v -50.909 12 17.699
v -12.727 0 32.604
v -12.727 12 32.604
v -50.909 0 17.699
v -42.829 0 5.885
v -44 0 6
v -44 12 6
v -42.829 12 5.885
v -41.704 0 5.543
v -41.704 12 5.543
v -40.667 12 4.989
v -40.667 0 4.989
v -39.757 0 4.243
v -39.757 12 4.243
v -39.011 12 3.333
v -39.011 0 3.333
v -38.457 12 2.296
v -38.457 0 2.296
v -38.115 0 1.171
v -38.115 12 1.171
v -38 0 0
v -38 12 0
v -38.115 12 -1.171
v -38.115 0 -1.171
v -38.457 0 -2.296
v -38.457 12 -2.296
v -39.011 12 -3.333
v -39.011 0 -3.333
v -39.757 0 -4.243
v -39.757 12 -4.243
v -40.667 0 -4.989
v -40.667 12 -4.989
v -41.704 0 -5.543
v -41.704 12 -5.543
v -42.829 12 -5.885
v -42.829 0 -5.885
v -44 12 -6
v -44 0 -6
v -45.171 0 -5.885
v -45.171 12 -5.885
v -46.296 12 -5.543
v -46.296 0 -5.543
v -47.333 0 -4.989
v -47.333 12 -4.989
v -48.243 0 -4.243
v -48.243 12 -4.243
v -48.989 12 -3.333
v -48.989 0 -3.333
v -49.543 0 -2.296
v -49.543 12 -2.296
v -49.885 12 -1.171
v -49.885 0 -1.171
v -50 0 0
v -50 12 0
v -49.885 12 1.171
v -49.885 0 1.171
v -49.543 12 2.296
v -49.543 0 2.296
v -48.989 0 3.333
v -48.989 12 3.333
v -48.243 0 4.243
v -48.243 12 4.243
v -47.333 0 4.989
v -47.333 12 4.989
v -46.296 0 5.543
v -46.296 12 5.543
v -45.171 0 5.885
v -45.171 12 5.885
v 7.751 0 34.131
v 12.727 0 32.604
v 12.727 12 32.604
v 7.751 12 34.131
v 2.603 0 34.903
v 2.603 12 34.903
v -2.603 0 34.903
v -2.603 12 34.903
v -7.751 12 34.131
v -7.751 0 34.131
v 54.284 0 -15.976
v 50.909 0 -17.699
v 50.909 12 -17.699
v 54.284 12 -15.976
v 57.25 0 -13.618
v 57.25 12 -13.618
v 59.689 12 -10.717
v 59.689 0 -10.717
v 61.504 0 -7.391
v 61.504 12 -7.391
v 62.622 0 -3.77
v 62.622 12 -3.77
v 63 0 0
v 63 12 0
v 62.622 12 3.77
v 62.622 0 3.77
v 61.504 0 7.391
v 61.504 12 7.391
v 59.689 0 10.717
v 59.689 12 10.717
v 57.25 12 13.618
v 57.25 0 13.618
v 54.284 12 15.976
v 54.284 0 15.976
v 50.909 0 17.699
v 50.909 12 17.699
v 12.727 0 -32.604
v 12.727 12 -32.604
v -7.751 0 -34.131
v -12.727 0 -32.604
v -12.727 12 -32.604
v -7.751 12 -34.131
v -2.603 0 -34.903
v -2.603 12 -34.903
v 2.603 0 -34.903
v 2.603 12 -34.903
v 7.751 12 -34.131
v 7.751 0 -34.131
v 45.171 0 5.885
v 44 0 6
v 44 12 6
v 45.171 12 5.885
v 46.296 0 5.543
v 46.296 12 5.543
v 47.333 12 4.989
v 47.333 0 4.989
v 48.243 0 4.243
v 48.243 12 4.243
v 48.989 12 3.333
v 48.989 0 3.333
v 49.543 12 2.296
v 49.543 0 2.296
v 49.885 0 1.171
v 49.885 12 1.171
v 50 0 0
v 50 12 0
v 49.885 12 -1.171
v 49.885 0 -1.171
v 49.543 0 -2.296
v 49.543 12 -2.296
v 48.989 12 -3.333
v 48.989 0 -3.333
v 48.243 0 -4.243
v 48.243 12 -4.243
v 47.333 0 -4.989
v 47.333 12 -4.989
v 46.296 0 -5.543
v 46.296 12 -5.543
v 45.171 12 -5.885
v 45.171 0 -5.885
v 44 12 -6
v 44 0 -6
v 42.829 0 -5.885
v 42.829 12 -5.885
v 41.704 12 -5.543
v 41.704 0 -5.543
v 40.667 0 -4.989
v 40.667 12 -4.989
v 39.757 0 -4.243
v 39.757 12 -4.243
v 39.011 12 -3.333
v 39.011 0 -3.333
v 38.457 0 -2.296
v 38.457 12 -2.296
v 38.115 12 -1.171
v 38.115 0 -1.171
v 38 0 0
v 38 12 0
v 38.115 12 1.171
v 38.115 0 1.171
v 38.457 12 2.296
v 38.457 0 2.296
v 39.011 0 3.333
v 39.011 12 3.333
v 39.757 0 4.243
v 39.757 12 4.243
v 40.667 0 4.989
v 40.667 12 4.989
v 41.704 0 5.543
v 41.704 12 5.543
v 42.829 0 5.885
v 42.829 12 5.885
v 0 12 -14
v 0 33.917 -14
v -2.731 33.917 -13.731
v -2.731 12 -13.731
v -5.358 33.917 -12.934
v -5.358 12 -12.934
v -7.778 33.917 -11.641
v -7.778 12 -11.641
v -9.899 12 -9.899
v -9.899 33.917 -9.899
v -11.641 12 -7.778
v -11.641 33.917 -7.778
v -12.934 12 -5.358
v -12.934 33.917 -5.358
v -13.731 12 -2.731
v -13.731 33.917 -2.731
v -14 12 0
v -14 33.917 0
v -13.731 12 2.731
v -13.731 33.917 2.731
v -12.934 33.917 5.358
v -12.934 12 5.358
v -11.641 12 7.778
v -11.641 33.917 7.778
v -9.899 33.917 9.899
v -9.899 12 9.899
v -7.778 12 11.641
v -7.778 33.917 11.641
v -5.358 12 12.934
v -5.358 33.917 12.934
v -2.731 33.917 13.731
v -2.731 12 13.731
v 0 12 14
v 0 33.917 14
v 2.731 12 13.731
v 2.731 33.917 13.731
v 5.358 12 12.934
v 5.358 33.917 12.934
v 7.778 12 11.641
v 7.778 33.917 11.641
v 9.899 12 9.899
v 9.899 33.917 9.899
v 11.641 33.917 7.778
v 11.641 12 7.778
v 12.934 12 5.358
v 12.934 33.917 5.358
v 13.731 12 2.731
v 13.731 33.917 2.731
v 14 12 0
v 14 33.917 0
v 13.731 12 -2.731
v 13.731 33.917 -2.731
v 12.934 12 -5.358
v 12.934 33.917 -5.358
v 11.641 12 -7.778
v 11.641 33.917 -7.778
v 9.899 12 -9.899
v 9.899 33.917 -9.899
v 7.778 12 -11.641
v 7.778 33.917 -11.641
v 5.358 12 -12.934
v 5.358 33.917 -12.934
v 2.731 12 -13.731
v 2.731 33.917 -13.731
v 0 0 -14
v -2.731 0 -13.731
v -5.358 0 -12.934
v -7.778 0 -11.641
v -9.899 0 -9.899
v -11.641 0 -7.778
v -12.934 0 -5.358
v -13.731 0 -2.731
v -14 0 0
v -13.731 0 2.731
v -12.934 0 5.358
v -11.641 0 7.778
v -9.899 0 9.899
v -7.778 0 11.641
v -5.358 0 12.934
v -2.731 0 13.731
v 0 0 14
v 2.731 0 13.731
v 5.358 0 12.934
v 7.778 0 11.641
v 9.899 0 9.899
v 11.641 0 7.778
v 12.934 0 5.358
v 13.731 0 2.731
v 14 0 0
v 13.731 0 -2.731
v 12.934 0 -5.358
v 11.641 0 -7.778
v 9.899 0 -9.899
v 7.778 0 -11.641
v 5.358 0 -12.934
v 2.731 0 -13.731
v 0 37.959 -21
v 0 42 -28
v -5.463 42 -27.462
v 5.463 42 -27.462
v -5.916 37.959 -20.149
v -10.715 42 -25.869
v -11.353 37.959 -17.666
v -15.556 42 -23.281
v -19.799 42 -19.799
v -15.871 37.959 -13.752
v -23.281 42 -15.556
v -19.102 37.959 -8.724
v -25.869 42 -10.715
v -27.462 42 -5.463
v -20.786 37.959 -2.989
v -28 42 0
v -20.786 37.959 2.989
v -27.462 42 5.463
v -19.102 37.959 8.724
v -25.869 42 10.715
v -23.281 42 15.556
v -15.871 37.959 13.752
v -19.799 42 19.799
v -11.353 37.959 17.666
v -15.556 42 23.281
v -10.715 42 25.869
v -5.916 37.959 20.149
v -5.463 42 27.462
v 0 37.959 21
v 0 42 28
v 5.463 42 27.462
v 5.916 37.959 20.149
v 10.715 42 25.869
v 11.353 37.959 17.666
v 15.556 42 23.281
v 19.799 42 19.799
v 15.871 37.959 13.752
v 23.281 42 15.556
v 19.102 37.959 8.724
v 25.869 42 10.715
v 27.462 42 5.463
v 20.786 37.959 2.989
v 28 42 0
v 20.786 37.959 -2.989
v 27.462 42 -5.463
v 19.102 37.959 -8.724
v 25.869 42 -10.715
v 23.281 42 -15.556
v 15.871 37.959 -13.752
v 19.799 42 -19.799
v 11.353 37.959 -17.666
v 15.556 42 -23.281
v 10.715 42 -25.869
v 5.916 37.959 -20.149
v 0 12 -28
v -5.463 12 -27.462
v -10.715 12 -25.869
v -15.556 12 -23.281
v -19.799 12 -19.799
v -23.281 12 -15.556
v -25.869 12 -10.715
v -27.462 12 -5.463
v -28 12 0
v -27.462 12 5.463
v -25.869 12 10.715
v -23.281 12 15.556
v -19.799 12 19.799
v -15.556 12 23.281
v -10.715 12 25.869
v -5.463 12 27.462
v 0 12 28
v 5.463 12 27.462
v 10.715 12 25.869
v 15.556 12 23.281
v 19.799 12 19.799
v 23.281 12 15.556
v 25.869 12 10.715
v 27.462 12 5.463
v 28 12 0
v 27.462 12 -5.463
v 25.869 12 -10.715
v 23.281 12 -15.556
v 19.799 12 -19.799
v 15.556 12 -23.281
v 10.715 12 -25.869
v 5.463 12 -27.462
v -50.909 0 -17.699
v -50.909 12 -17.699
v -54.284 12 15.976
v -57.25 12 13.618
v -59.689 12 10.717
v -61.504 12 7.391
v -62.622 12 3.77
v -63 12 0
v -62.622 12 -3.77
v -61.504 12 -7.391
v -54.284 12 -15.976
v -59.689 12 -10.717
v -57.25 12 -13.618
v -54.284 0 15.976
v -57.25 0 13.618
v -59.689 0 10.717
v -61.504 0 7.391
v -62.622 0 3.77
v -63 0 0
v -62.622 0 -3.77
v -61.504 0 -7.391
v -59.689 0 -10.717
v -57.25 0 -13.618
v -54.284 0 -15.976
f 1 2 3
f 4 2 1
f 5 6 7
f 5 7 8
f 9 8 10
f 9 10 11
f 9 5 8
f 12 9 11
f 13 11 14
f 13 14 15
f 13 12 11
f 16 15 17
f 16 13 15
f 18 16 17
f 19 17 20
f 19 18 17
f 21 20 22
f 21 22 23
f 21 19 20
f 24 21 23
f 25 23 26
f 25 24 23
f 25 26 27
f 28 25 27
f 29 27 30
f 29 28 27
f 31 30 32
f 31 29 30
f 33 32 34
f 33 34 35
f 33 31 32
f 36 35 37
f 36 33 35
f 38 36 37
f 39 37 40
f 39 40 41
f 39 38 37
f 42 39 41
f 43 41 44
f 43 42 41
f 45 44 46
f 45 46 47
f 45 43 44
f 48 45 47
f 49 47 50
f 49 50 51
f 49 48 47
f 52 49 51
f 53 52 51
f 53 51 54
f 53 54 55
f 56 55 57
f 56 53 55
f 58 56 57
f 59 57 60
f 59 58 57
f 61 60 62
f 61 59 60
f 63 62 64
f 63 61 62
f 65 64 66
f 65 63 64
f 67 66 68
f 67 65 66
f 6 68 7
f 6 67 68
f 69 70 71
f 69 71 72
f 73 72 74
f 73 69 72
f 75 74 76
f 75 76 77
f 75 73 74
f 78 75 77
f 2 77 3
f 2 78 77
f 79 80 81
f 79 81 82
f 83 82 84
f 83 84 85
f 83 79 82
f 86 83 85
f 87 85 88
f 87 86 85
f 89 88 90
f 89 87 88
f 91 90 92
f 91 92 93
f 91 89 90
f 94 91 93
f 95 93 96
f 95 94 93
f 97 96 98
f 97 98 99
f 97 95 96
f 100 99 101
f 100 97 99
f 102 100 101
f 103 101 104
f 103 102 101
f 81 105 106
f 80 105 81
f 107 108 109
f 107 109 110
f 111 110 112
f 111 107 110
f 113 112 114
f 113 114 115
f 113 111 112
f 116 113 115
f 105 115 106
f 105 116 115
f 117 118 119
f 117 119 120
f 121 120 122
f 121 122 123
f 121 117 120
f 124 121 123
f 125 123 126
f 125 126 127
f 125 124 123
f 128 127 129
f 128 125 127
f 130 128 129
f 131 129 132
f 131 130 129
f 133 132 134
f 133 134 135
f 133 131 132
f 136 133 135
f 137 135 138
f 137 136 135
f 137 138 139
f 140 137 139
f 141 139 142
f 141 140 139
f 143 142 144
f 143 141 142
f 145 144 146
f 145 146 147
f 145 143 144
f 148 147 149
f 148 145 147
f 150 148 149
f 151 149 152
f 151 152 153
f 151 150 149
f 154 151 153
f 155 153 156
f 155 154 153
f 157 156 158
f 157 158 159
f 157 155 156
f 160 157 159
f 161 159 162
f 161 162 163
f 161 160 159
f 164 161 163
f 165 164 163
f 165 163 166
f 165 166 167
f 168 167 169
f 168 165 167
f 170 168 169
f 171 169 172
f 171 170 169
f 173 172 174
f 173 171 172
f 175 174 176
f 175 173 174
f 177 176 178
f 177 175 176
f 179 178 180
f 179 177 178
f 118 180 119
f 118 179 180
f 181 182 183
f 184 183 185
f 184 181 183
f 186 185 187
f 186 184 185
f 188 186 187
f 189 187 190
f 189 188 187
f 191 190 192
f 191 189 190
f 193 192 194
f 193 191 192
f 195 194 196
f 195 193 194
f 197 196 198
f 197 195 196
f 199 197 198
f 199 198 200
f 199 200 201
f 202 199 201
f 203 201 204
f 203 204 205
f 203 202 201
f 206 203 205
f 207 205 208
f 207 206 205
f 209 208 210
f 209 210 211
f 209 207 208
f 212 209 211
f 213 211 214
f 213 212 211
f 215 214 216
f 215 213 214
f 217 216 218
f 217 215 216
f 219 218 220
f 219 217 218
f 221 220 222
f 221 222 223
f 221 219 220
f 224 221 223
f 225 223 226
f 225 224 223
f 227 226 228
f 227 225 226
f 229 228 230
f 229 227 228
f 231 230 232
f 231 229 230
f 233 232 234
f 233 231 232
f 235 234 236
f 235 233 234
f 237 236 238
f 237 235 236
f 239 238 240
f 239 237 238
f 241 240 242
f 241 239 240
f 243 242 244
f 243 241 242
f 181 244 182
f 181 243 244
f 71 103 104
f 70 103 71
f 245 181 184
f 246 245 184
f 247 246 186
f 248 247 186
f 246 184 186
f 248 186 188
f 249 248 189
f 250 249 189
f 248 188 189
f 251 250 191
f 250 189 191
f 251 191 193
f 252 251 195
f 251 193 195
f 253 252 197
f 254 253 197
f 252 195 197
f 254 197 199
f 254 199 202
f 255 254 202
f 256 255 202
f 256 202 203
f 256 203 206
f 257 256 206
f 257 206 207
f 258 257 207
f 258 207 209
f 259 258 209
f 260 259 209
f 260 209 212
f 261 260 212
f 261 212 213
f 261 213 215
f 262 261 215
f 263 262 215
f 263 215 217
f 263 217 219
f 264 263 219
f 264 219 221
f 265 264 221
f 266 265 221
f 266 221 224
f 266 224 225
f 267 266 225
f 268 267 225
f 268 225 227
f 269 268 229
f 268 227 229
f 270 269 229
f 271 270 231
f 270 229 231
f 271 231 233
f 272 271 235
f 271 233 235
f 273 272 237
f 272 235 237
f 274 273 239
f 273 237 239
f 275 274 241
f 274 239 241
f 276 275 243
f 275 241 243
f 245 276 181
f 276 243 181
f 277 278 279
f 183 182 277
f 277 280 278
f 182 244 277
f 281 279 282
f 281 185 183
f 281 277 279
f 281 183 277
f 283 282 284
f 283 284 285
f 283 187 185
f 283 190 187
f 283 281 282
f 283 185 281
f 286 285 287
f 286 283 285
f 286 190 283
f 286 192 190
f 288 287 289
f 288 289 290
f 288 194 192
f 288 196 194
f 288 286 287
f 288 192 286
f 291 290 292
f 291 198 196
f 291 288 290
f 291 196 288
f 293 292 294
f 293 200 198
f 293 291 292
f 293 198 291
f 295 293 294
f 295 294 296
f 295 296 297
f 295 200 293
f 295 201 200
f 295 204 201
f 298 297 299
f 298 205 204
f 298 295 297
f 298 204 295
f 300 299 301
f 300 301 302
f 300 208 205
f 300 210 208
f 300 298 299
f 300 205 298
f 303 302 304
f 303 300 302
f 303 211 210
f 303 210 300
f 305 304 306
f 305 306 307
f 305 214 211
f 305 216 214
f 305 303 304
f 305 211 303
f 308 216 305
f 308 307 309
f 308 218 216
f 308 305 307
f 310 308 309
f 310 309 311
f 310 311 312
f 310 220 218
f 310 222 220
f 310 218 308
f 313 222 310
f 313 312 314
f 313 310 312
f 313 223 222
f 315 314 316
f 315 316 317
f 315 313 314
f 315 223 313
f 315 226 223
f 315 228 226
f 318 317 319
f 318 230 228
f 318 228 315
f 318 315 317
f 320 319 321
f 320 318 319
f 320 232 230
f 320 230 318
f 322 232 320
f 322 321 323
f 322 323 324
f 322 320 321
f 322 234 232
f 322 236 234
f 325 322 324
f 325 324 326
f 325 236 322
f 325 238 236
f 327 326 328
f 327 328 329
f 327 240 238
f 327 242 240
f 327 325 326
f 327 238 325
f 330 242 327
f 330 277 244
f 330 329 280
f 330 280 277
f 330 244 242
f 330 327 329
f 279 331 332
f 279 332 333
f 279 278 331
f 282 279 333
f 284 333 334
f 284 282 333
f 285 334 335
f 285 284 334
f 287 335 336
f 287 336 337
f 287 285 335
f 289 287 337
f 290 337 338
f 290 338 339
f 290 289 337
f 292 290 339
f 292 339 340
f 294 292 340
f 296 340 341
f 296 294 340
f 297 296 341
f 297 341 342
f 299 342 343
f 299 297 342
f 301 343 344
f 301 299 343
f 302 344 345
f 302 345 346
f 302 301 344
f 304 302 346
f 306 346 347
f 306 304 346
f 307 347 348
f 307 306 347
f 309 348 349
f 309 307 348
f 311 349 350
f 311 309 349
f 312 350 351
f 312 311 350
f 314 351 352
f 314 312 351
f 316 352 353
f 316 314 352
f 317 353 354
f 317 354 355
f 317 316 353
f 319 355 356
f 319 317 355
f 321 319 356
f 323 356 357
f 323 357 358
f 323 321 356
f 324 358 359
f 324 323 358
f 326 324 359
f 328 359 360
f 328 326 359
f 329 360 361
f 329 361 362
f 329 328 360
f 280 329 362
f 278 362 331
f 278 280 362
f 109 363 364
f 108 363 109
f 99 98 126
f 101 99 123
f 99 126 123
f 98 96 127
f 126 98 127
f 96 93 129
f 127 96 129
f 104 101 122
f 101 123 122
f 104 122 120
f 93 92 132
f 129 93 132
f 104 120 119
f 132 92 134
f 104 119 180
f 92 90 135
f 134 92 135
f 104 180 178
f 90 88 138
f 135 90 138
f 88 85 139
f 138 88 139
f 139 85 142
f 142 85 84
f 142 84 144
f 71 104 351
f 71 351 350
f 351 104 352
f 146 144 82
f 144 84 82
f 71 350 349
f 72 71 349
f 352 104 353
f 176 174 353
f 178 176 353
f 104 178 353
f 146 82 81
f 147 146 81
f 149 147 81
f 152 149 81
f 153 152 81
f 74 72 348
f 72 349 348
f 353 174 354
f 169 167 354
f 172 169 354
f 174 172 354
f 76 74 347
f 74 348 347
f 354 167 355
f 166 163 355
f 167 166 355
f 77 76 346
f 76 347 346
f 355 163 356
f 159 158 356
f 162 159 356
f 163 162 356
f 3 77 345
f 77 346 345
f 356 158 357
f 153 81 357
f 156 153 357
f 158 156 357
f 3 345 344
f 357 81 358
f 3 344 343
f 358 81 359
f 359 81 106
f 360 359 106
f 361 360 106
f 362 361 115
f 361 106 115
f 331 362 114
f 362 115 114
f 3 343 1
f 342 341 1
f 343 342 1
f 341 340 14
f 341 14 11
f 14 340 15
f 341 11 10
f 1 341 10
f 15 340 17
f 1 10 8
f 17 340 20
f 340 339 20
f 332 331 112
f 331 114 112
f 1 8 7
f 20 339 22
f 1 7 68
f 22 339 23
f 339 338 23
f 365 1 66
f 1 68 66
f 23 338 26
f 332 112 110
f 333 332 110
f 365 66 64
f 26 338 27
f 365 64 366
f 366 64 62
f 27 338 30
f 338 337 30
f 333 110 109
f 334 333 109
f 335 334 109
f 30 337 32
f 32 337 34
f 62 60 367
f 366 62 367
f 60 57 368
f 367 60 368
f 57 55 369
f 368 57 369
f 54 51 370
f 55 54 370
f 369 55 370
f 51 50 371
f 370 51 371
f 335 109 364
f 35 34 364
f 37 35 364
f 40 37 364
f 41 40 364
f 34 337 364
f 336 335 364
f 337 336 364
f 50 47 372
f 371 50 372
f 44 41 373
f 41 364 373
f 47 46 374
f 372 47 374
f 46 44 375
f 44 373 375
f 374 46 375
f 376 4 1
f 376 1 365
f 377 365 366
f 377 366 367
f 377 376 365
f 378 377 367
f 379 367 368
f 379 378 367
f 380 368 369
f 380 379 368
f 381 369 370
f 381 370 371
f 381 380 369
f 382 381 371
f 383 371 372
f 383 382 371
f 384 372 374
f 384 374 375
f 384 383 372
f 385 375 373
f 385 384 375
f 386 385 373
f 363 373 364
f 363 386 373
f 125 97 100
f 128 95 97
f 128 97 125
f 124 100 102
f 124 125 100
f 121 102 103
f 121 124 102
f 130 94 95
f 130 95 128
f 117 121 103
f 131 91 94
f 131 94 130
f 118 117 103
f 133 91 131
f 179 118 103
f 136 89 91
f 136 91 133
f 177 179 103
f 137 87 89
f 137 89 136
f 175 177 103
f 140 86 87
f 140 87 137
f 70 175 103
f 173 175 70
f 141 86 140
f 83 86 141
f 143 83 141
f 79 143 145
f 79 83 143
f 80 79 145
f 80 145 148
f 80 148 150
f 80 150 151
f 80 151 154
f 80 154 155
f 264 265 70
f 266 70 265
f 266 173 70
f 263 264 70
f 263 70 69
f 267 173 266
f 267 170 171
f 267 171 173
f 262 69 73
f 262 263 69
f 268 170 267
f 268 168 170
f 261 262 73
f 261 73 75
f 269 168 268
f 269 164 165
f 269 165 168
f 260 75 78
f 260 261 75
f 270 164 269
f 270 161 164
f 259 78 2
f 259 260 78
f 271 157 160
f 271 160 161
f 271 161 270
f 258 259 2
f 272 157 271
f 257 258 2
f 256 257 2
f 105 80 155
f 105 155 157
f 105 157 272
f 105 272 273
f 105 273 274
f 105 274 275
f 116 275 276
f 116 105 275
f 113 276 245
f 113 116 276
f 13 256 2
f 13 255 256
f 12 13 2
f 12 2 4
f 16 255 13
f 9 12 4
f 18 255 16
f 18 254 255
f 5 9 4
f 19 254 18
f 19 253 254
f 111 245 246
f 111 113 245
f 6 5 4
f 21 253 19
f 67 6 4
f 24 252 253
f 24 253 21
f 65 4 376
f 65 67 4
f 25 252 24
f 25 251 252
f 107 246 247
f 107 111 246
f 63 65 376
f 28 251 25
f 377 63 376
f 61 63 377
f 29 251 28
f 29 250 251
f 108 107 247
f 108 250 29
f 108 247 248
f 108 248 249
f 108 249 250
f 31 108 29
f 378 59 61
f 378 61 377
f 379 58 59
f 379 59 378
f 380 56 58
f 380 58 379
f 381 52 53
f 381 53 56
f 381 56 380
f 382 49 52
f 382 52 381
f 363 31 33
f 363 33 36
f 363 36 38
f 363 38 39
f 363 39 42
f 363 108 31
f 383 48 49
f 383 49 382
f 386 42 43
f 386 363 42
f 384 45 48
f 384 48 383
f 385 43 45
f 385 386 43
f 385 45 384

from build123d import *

# Parameters (mm, degrees)
SKETCH1_R           = 6
BOSS_EXTRUDE1_DEPTH = 12
CUT_EXTRUDE1_REACH  = 80.064
SKETCH3_R           = 14


with BuildPart() as part:
    # Sketch1 → Boss-Extrude1 (new body)
    with BuildSketch(Plane(origin=(0, 0, 0), x_dir=(1, 0, 0), z_dir=(0, 1, 0))):
        with BuildLine():
            Line((-50.909090909, 17.699278596), (-12.727272727, 32.603934255))
            ThreePointArc((-12.727272727, 32.603934255), (0, 35), (12.727272727, 32.603934255))
            Line((12.727272727, 32.603934255), (50.909090909, 17.699278596))
            ThreePointArc((50.909090909, 17.699278596), (63, 0), (50.909090909, -17.699278596))
            Line((50.909090909, -17.699278596), (12.727272727, -32.603934255))
            ThreePointArc((12.727272727, -32.603934255), (0, -35), (-12.727272727, -32.603934255))
            Line((-12.727272727, -32.603934255), (-50.909090909, -17.699278596))
            ThreePointArc((-50.909090909, -17.699278596), (-63, 0), (-50.909090909, 17.699278596))
        make_face()
        with Locations(Location((-44, 0, 0), (0, 0, 270))):
            Circle(SKETCH1_R, mode=Mode.SUBTRACT)
        with Locations(Location((44, 0, 0), (0, 0, 270))):
            Circle(SKETCH1_R, mode=Mode.SUBTRACT)
    extrude(amount=BOSS_EXTRUDE1_DEPTH)

    # Sketch2 → Revolve1 (revolve)
    with BuildSketch(Plane.XY, mode=Mode.PRIVATE) as revolve1_sk:
        Polygon((-14, 33.917096231), (-14, 12), (-28, 12), (-28, 42), align=None)
    revolve(revolve1_sk.sketch.rotate(Axis((0, 0, 0), (0, 1, 0)), 270), axis=Axis((0, 0, 0), (0, 1, 0)))

    # Sketch3 → Cut-Extrude1 (cut, up to next)
    with BuildSketch(Plane(origin=(0, 12, 0), x_dir=(1, 0, 0), z_dir=(0, 1, 0)), mode=Mode.PRIVATE) as cut_extrude1_sk1:
        with Locations(Location((0, 0, 0), (0, 0, 90))):
            Circle(SKETCH3_R)
    cut_extrude1_tool1 = extrude(cut_extrude1_sk1.sketch, amount=-CUT_EXTRUDE1_REACH, mode=Mode.PRIVATE) & part.part
    add(cut_extrude1_tool1.solids().sort_by_distance((0, 12, 0))[0], mode=Mode.SUBTRACT)


solid = part.part
